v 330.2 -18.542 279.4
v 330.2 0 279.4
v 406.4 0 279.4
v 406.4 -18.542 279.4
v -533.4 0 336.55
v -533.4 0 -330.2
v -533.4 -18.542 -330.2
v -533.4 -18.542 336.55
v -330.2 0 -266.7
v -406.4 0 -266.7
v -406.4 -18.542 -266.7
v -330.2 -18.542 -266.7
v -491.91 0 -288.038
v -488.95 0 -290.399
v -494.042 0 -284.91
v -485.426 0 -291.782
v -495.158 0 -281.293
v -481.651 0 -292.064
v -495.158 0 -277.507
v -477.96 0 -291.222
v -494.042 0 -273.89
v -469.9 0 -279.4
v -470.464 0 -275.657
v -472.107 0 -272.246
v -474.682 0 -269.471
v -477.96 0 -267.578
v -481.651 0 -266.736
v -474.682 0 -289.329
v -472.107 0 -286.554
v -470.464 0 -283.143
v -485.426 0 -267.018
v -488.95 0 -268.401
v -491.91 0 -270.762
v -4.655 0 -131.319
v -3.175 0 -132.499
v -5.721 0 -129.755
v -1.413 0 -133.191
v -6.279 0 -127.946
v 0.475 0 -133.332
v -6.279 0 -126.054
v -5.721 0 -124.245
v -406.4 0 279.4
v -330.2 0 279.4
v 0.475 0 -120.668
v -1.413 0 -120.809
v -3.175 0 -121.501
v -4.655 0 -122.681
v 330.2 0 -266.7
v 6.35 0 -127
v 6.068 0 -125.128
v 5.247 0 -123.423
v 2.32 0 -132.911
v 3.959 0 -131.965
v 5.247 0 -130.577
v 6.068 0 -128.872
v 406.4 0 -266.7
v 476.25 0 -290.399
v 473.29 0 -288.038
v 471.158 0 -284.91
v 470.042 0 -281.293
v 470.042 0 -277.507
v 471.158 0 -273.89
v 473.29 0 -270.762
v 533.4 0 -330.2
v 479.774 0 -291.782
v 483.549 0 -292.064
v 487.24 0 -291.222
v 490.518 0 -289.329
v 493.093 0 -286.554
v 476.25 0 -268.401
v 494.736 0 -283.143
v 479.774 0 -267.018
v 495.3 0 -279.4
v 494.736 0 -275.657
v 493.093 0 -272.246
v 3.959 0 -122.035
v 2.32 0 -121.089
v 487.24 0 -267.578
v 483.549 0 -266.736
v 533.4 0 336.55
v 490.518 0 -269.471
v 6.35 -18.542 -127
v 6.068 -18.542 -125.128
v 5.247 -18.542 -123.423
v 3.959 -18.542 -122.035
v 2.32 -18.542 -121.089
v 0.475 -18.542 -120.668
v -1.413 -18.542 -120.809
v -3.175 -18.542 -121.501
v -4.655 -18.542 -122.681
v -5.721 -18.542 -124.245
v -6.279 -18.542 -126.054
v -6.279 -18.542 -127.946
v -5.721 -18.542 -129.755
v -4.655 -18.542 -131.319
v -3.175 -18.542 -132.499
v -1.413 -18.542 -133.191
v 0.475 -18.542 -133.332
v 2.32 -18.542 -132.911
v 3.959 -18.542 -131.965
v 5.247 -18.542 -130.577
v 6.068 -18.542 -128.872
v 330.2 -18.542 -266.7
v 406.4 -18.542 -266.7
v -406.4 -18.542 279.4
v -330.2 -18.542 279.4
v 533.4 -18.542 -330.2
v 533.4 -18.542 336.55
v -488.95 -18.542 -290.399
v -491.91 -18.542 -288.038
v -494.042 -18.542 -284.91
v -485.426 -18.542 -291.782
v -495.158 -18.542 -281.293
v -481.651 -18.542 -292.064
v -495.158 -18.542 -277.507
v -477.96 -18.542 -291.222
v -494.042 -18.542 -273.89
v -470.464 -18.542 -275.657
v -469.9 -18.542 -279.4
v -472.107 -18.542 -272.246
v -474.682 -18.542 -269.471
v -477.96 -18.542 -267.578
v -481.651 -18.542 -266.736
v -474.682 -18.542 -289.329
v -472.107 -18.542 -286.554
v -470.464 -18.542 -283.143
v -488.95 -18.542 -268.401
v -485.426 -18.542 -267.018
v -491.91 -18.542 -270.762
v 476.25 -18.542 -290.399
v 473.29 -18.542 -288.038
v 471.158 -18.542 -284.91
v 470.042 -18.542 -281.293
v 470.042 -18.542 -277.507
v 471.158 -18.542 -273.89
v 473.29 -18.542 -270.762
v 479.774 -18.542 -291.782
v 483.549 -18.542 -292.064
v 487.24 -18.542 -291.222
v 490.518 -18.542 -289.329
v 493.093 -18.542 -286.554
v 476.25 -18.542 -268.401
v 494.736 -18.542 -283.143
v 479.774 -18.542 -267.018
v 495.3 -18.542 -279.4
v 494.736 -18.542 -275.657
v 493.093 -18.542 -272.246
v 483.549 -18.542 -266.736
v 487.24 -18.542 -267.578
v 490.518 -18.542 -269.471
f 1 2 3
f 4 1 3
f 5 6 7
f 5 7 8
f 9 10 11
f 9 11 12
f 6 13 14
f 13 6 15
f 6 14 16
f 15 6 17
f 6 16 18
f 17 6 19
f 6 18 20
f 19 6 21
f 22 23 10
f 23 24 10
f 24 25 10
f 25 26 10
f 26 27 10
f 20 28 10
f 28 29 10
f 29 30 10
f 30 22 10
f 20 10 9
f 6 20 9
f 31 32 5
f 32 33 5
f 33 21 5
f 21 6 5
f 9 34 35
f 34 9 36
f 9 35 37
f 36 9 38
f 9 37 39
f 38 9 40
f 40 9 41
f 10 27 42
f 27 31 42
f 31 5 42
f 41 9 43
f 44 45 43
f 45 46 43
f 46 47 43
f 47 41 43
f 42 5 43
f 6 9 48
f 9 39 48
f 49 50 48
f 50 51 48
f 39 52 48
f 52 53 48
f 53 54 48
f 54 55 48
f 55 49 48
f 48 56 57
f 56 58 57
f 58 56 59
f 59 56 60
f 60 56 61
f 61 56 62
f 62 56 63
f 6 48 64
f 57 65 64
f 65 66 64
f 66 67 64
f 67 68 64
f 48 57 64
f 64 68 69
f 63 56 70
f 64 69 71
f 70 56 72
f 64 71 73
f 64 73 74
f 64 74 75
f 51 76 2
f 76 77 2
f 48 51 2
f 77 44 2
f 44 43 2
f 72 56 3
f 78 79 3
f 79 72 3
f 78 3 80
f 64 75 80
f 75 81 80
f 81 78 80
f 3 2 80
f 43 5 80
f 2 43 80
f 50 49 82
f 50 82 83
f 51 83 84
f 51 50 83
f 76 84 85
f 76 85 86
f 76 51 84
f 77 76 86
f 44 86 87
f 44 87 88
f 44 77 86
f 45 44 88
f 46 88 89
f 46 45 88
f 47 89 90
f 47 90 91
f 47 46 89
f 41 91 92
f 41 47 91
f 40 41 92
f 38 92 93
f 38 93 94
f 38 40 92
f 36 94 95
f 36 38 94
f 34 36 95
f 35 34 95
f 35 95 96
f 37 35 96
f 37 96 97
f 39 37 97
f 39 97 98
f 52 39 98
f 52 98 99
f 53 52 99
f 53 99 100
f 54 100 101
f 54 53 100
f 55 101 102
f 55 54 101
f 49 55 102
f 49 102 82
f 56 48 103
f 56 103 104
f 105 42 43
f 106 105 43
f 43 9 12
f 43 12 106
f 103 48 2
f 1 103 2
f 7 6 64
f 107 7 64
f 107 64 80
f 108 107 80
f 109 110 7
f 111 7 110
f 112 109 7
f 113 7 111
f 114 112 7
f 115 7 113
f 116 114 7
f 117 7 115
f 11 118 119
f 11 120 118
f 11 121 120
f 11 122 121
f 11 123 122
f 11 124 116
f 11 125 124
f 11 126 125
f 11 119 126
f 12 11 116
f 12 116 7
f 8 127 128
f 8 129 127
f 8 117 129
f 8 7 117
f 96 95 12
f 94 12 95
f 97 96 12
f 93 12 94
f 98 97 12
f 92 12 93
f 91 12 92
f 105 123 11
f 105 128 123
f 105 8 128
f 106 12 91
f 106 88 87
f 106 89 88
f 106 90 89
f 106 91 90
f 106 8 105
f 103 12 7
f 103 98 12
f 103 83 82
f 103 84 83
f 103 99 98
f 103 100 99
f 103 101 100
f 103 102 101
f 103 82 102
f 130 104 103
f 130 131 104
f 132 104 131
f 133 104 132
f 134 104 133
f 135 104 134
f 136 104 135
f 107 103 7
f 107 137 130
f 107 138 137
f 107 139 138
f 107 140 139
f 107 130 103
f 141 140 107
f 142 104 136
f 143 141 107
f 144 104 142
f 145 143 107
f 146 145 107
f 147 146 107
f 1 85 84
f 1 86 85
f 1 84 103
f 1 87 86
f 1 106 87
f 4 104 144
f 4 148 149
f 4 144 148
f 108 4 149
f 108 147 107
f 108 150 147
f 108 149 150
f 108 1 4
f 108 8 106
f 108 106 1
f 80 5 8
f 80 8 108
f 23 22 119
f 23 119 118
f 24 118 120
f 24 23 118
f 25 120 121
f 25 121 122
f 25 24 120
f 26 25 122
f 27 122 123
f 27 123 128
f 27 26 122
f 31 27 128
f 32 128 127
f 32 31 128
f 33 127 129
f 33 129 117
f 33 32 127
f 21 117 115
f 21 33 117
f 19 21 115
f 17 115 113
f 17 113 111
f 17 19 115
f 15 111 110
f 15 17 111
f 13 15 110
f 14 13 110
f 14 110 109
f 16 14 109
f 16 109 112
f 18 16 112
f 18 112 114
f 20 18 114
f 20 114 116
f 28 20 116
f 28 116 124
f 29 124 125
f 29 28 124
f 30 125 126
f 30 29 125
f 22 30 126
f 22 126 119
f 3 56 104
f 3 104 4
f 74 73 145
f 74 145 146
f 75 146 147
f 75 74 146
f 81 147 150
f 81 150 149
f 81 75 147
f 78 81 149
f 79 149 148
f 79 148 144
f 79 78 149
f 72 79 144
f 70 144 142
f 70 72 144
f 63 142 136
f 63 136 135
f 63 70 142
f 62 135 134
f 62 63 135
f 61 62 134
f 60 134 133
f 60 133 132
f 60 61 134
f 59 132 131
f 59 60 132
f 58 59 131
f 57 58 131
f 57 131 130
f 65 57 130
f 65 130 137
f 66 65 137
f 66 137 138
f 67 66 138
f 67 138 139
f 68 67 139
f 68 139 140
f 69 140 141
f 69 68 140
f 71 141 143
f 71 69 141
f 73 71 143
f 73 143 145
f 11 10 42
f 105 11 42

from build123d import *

# Parameters (mm, degrees)
F0_W     = 1066.8
F0_H     = 666.75
F0_R     = 12.7
F0_R_2   = 6.35
F0_W_2   = 76.2
F0_H_2   = 546.1
F1_DEPTH = 18.542


with BuildPart() as f1:
    # F0 (on Front) → F1 (new body)
    with BuildSketch(Plane.XZ):
        with Locations((0, 3.175)):
            Rectangle(F0_W, F0_H)
        with Locations((-482.6, -279.4)):
            Circle(F0_R, mode=Mode.SUBTRACT)
        with Locations((482.6, -279.4)):
            Circle(F0_R, mode=Mode.SUBTRACT)
        with Locations((0, -127)):
            Circle(F0_R_2, mode=Mode.SUBTRACT)
        with Locations((-368.3, 6.35)):
            Rectangle(F0_W_2, F0_H_2, mode=Mode.SUBTRACT)
        with Locations((368.3, 6.35)):
            Rectangle(F0_W_2, F0_H_2, mode=Mode.SUBTRACT)
    extrude(amount=F1_DEPTH)


solid = f1.part
